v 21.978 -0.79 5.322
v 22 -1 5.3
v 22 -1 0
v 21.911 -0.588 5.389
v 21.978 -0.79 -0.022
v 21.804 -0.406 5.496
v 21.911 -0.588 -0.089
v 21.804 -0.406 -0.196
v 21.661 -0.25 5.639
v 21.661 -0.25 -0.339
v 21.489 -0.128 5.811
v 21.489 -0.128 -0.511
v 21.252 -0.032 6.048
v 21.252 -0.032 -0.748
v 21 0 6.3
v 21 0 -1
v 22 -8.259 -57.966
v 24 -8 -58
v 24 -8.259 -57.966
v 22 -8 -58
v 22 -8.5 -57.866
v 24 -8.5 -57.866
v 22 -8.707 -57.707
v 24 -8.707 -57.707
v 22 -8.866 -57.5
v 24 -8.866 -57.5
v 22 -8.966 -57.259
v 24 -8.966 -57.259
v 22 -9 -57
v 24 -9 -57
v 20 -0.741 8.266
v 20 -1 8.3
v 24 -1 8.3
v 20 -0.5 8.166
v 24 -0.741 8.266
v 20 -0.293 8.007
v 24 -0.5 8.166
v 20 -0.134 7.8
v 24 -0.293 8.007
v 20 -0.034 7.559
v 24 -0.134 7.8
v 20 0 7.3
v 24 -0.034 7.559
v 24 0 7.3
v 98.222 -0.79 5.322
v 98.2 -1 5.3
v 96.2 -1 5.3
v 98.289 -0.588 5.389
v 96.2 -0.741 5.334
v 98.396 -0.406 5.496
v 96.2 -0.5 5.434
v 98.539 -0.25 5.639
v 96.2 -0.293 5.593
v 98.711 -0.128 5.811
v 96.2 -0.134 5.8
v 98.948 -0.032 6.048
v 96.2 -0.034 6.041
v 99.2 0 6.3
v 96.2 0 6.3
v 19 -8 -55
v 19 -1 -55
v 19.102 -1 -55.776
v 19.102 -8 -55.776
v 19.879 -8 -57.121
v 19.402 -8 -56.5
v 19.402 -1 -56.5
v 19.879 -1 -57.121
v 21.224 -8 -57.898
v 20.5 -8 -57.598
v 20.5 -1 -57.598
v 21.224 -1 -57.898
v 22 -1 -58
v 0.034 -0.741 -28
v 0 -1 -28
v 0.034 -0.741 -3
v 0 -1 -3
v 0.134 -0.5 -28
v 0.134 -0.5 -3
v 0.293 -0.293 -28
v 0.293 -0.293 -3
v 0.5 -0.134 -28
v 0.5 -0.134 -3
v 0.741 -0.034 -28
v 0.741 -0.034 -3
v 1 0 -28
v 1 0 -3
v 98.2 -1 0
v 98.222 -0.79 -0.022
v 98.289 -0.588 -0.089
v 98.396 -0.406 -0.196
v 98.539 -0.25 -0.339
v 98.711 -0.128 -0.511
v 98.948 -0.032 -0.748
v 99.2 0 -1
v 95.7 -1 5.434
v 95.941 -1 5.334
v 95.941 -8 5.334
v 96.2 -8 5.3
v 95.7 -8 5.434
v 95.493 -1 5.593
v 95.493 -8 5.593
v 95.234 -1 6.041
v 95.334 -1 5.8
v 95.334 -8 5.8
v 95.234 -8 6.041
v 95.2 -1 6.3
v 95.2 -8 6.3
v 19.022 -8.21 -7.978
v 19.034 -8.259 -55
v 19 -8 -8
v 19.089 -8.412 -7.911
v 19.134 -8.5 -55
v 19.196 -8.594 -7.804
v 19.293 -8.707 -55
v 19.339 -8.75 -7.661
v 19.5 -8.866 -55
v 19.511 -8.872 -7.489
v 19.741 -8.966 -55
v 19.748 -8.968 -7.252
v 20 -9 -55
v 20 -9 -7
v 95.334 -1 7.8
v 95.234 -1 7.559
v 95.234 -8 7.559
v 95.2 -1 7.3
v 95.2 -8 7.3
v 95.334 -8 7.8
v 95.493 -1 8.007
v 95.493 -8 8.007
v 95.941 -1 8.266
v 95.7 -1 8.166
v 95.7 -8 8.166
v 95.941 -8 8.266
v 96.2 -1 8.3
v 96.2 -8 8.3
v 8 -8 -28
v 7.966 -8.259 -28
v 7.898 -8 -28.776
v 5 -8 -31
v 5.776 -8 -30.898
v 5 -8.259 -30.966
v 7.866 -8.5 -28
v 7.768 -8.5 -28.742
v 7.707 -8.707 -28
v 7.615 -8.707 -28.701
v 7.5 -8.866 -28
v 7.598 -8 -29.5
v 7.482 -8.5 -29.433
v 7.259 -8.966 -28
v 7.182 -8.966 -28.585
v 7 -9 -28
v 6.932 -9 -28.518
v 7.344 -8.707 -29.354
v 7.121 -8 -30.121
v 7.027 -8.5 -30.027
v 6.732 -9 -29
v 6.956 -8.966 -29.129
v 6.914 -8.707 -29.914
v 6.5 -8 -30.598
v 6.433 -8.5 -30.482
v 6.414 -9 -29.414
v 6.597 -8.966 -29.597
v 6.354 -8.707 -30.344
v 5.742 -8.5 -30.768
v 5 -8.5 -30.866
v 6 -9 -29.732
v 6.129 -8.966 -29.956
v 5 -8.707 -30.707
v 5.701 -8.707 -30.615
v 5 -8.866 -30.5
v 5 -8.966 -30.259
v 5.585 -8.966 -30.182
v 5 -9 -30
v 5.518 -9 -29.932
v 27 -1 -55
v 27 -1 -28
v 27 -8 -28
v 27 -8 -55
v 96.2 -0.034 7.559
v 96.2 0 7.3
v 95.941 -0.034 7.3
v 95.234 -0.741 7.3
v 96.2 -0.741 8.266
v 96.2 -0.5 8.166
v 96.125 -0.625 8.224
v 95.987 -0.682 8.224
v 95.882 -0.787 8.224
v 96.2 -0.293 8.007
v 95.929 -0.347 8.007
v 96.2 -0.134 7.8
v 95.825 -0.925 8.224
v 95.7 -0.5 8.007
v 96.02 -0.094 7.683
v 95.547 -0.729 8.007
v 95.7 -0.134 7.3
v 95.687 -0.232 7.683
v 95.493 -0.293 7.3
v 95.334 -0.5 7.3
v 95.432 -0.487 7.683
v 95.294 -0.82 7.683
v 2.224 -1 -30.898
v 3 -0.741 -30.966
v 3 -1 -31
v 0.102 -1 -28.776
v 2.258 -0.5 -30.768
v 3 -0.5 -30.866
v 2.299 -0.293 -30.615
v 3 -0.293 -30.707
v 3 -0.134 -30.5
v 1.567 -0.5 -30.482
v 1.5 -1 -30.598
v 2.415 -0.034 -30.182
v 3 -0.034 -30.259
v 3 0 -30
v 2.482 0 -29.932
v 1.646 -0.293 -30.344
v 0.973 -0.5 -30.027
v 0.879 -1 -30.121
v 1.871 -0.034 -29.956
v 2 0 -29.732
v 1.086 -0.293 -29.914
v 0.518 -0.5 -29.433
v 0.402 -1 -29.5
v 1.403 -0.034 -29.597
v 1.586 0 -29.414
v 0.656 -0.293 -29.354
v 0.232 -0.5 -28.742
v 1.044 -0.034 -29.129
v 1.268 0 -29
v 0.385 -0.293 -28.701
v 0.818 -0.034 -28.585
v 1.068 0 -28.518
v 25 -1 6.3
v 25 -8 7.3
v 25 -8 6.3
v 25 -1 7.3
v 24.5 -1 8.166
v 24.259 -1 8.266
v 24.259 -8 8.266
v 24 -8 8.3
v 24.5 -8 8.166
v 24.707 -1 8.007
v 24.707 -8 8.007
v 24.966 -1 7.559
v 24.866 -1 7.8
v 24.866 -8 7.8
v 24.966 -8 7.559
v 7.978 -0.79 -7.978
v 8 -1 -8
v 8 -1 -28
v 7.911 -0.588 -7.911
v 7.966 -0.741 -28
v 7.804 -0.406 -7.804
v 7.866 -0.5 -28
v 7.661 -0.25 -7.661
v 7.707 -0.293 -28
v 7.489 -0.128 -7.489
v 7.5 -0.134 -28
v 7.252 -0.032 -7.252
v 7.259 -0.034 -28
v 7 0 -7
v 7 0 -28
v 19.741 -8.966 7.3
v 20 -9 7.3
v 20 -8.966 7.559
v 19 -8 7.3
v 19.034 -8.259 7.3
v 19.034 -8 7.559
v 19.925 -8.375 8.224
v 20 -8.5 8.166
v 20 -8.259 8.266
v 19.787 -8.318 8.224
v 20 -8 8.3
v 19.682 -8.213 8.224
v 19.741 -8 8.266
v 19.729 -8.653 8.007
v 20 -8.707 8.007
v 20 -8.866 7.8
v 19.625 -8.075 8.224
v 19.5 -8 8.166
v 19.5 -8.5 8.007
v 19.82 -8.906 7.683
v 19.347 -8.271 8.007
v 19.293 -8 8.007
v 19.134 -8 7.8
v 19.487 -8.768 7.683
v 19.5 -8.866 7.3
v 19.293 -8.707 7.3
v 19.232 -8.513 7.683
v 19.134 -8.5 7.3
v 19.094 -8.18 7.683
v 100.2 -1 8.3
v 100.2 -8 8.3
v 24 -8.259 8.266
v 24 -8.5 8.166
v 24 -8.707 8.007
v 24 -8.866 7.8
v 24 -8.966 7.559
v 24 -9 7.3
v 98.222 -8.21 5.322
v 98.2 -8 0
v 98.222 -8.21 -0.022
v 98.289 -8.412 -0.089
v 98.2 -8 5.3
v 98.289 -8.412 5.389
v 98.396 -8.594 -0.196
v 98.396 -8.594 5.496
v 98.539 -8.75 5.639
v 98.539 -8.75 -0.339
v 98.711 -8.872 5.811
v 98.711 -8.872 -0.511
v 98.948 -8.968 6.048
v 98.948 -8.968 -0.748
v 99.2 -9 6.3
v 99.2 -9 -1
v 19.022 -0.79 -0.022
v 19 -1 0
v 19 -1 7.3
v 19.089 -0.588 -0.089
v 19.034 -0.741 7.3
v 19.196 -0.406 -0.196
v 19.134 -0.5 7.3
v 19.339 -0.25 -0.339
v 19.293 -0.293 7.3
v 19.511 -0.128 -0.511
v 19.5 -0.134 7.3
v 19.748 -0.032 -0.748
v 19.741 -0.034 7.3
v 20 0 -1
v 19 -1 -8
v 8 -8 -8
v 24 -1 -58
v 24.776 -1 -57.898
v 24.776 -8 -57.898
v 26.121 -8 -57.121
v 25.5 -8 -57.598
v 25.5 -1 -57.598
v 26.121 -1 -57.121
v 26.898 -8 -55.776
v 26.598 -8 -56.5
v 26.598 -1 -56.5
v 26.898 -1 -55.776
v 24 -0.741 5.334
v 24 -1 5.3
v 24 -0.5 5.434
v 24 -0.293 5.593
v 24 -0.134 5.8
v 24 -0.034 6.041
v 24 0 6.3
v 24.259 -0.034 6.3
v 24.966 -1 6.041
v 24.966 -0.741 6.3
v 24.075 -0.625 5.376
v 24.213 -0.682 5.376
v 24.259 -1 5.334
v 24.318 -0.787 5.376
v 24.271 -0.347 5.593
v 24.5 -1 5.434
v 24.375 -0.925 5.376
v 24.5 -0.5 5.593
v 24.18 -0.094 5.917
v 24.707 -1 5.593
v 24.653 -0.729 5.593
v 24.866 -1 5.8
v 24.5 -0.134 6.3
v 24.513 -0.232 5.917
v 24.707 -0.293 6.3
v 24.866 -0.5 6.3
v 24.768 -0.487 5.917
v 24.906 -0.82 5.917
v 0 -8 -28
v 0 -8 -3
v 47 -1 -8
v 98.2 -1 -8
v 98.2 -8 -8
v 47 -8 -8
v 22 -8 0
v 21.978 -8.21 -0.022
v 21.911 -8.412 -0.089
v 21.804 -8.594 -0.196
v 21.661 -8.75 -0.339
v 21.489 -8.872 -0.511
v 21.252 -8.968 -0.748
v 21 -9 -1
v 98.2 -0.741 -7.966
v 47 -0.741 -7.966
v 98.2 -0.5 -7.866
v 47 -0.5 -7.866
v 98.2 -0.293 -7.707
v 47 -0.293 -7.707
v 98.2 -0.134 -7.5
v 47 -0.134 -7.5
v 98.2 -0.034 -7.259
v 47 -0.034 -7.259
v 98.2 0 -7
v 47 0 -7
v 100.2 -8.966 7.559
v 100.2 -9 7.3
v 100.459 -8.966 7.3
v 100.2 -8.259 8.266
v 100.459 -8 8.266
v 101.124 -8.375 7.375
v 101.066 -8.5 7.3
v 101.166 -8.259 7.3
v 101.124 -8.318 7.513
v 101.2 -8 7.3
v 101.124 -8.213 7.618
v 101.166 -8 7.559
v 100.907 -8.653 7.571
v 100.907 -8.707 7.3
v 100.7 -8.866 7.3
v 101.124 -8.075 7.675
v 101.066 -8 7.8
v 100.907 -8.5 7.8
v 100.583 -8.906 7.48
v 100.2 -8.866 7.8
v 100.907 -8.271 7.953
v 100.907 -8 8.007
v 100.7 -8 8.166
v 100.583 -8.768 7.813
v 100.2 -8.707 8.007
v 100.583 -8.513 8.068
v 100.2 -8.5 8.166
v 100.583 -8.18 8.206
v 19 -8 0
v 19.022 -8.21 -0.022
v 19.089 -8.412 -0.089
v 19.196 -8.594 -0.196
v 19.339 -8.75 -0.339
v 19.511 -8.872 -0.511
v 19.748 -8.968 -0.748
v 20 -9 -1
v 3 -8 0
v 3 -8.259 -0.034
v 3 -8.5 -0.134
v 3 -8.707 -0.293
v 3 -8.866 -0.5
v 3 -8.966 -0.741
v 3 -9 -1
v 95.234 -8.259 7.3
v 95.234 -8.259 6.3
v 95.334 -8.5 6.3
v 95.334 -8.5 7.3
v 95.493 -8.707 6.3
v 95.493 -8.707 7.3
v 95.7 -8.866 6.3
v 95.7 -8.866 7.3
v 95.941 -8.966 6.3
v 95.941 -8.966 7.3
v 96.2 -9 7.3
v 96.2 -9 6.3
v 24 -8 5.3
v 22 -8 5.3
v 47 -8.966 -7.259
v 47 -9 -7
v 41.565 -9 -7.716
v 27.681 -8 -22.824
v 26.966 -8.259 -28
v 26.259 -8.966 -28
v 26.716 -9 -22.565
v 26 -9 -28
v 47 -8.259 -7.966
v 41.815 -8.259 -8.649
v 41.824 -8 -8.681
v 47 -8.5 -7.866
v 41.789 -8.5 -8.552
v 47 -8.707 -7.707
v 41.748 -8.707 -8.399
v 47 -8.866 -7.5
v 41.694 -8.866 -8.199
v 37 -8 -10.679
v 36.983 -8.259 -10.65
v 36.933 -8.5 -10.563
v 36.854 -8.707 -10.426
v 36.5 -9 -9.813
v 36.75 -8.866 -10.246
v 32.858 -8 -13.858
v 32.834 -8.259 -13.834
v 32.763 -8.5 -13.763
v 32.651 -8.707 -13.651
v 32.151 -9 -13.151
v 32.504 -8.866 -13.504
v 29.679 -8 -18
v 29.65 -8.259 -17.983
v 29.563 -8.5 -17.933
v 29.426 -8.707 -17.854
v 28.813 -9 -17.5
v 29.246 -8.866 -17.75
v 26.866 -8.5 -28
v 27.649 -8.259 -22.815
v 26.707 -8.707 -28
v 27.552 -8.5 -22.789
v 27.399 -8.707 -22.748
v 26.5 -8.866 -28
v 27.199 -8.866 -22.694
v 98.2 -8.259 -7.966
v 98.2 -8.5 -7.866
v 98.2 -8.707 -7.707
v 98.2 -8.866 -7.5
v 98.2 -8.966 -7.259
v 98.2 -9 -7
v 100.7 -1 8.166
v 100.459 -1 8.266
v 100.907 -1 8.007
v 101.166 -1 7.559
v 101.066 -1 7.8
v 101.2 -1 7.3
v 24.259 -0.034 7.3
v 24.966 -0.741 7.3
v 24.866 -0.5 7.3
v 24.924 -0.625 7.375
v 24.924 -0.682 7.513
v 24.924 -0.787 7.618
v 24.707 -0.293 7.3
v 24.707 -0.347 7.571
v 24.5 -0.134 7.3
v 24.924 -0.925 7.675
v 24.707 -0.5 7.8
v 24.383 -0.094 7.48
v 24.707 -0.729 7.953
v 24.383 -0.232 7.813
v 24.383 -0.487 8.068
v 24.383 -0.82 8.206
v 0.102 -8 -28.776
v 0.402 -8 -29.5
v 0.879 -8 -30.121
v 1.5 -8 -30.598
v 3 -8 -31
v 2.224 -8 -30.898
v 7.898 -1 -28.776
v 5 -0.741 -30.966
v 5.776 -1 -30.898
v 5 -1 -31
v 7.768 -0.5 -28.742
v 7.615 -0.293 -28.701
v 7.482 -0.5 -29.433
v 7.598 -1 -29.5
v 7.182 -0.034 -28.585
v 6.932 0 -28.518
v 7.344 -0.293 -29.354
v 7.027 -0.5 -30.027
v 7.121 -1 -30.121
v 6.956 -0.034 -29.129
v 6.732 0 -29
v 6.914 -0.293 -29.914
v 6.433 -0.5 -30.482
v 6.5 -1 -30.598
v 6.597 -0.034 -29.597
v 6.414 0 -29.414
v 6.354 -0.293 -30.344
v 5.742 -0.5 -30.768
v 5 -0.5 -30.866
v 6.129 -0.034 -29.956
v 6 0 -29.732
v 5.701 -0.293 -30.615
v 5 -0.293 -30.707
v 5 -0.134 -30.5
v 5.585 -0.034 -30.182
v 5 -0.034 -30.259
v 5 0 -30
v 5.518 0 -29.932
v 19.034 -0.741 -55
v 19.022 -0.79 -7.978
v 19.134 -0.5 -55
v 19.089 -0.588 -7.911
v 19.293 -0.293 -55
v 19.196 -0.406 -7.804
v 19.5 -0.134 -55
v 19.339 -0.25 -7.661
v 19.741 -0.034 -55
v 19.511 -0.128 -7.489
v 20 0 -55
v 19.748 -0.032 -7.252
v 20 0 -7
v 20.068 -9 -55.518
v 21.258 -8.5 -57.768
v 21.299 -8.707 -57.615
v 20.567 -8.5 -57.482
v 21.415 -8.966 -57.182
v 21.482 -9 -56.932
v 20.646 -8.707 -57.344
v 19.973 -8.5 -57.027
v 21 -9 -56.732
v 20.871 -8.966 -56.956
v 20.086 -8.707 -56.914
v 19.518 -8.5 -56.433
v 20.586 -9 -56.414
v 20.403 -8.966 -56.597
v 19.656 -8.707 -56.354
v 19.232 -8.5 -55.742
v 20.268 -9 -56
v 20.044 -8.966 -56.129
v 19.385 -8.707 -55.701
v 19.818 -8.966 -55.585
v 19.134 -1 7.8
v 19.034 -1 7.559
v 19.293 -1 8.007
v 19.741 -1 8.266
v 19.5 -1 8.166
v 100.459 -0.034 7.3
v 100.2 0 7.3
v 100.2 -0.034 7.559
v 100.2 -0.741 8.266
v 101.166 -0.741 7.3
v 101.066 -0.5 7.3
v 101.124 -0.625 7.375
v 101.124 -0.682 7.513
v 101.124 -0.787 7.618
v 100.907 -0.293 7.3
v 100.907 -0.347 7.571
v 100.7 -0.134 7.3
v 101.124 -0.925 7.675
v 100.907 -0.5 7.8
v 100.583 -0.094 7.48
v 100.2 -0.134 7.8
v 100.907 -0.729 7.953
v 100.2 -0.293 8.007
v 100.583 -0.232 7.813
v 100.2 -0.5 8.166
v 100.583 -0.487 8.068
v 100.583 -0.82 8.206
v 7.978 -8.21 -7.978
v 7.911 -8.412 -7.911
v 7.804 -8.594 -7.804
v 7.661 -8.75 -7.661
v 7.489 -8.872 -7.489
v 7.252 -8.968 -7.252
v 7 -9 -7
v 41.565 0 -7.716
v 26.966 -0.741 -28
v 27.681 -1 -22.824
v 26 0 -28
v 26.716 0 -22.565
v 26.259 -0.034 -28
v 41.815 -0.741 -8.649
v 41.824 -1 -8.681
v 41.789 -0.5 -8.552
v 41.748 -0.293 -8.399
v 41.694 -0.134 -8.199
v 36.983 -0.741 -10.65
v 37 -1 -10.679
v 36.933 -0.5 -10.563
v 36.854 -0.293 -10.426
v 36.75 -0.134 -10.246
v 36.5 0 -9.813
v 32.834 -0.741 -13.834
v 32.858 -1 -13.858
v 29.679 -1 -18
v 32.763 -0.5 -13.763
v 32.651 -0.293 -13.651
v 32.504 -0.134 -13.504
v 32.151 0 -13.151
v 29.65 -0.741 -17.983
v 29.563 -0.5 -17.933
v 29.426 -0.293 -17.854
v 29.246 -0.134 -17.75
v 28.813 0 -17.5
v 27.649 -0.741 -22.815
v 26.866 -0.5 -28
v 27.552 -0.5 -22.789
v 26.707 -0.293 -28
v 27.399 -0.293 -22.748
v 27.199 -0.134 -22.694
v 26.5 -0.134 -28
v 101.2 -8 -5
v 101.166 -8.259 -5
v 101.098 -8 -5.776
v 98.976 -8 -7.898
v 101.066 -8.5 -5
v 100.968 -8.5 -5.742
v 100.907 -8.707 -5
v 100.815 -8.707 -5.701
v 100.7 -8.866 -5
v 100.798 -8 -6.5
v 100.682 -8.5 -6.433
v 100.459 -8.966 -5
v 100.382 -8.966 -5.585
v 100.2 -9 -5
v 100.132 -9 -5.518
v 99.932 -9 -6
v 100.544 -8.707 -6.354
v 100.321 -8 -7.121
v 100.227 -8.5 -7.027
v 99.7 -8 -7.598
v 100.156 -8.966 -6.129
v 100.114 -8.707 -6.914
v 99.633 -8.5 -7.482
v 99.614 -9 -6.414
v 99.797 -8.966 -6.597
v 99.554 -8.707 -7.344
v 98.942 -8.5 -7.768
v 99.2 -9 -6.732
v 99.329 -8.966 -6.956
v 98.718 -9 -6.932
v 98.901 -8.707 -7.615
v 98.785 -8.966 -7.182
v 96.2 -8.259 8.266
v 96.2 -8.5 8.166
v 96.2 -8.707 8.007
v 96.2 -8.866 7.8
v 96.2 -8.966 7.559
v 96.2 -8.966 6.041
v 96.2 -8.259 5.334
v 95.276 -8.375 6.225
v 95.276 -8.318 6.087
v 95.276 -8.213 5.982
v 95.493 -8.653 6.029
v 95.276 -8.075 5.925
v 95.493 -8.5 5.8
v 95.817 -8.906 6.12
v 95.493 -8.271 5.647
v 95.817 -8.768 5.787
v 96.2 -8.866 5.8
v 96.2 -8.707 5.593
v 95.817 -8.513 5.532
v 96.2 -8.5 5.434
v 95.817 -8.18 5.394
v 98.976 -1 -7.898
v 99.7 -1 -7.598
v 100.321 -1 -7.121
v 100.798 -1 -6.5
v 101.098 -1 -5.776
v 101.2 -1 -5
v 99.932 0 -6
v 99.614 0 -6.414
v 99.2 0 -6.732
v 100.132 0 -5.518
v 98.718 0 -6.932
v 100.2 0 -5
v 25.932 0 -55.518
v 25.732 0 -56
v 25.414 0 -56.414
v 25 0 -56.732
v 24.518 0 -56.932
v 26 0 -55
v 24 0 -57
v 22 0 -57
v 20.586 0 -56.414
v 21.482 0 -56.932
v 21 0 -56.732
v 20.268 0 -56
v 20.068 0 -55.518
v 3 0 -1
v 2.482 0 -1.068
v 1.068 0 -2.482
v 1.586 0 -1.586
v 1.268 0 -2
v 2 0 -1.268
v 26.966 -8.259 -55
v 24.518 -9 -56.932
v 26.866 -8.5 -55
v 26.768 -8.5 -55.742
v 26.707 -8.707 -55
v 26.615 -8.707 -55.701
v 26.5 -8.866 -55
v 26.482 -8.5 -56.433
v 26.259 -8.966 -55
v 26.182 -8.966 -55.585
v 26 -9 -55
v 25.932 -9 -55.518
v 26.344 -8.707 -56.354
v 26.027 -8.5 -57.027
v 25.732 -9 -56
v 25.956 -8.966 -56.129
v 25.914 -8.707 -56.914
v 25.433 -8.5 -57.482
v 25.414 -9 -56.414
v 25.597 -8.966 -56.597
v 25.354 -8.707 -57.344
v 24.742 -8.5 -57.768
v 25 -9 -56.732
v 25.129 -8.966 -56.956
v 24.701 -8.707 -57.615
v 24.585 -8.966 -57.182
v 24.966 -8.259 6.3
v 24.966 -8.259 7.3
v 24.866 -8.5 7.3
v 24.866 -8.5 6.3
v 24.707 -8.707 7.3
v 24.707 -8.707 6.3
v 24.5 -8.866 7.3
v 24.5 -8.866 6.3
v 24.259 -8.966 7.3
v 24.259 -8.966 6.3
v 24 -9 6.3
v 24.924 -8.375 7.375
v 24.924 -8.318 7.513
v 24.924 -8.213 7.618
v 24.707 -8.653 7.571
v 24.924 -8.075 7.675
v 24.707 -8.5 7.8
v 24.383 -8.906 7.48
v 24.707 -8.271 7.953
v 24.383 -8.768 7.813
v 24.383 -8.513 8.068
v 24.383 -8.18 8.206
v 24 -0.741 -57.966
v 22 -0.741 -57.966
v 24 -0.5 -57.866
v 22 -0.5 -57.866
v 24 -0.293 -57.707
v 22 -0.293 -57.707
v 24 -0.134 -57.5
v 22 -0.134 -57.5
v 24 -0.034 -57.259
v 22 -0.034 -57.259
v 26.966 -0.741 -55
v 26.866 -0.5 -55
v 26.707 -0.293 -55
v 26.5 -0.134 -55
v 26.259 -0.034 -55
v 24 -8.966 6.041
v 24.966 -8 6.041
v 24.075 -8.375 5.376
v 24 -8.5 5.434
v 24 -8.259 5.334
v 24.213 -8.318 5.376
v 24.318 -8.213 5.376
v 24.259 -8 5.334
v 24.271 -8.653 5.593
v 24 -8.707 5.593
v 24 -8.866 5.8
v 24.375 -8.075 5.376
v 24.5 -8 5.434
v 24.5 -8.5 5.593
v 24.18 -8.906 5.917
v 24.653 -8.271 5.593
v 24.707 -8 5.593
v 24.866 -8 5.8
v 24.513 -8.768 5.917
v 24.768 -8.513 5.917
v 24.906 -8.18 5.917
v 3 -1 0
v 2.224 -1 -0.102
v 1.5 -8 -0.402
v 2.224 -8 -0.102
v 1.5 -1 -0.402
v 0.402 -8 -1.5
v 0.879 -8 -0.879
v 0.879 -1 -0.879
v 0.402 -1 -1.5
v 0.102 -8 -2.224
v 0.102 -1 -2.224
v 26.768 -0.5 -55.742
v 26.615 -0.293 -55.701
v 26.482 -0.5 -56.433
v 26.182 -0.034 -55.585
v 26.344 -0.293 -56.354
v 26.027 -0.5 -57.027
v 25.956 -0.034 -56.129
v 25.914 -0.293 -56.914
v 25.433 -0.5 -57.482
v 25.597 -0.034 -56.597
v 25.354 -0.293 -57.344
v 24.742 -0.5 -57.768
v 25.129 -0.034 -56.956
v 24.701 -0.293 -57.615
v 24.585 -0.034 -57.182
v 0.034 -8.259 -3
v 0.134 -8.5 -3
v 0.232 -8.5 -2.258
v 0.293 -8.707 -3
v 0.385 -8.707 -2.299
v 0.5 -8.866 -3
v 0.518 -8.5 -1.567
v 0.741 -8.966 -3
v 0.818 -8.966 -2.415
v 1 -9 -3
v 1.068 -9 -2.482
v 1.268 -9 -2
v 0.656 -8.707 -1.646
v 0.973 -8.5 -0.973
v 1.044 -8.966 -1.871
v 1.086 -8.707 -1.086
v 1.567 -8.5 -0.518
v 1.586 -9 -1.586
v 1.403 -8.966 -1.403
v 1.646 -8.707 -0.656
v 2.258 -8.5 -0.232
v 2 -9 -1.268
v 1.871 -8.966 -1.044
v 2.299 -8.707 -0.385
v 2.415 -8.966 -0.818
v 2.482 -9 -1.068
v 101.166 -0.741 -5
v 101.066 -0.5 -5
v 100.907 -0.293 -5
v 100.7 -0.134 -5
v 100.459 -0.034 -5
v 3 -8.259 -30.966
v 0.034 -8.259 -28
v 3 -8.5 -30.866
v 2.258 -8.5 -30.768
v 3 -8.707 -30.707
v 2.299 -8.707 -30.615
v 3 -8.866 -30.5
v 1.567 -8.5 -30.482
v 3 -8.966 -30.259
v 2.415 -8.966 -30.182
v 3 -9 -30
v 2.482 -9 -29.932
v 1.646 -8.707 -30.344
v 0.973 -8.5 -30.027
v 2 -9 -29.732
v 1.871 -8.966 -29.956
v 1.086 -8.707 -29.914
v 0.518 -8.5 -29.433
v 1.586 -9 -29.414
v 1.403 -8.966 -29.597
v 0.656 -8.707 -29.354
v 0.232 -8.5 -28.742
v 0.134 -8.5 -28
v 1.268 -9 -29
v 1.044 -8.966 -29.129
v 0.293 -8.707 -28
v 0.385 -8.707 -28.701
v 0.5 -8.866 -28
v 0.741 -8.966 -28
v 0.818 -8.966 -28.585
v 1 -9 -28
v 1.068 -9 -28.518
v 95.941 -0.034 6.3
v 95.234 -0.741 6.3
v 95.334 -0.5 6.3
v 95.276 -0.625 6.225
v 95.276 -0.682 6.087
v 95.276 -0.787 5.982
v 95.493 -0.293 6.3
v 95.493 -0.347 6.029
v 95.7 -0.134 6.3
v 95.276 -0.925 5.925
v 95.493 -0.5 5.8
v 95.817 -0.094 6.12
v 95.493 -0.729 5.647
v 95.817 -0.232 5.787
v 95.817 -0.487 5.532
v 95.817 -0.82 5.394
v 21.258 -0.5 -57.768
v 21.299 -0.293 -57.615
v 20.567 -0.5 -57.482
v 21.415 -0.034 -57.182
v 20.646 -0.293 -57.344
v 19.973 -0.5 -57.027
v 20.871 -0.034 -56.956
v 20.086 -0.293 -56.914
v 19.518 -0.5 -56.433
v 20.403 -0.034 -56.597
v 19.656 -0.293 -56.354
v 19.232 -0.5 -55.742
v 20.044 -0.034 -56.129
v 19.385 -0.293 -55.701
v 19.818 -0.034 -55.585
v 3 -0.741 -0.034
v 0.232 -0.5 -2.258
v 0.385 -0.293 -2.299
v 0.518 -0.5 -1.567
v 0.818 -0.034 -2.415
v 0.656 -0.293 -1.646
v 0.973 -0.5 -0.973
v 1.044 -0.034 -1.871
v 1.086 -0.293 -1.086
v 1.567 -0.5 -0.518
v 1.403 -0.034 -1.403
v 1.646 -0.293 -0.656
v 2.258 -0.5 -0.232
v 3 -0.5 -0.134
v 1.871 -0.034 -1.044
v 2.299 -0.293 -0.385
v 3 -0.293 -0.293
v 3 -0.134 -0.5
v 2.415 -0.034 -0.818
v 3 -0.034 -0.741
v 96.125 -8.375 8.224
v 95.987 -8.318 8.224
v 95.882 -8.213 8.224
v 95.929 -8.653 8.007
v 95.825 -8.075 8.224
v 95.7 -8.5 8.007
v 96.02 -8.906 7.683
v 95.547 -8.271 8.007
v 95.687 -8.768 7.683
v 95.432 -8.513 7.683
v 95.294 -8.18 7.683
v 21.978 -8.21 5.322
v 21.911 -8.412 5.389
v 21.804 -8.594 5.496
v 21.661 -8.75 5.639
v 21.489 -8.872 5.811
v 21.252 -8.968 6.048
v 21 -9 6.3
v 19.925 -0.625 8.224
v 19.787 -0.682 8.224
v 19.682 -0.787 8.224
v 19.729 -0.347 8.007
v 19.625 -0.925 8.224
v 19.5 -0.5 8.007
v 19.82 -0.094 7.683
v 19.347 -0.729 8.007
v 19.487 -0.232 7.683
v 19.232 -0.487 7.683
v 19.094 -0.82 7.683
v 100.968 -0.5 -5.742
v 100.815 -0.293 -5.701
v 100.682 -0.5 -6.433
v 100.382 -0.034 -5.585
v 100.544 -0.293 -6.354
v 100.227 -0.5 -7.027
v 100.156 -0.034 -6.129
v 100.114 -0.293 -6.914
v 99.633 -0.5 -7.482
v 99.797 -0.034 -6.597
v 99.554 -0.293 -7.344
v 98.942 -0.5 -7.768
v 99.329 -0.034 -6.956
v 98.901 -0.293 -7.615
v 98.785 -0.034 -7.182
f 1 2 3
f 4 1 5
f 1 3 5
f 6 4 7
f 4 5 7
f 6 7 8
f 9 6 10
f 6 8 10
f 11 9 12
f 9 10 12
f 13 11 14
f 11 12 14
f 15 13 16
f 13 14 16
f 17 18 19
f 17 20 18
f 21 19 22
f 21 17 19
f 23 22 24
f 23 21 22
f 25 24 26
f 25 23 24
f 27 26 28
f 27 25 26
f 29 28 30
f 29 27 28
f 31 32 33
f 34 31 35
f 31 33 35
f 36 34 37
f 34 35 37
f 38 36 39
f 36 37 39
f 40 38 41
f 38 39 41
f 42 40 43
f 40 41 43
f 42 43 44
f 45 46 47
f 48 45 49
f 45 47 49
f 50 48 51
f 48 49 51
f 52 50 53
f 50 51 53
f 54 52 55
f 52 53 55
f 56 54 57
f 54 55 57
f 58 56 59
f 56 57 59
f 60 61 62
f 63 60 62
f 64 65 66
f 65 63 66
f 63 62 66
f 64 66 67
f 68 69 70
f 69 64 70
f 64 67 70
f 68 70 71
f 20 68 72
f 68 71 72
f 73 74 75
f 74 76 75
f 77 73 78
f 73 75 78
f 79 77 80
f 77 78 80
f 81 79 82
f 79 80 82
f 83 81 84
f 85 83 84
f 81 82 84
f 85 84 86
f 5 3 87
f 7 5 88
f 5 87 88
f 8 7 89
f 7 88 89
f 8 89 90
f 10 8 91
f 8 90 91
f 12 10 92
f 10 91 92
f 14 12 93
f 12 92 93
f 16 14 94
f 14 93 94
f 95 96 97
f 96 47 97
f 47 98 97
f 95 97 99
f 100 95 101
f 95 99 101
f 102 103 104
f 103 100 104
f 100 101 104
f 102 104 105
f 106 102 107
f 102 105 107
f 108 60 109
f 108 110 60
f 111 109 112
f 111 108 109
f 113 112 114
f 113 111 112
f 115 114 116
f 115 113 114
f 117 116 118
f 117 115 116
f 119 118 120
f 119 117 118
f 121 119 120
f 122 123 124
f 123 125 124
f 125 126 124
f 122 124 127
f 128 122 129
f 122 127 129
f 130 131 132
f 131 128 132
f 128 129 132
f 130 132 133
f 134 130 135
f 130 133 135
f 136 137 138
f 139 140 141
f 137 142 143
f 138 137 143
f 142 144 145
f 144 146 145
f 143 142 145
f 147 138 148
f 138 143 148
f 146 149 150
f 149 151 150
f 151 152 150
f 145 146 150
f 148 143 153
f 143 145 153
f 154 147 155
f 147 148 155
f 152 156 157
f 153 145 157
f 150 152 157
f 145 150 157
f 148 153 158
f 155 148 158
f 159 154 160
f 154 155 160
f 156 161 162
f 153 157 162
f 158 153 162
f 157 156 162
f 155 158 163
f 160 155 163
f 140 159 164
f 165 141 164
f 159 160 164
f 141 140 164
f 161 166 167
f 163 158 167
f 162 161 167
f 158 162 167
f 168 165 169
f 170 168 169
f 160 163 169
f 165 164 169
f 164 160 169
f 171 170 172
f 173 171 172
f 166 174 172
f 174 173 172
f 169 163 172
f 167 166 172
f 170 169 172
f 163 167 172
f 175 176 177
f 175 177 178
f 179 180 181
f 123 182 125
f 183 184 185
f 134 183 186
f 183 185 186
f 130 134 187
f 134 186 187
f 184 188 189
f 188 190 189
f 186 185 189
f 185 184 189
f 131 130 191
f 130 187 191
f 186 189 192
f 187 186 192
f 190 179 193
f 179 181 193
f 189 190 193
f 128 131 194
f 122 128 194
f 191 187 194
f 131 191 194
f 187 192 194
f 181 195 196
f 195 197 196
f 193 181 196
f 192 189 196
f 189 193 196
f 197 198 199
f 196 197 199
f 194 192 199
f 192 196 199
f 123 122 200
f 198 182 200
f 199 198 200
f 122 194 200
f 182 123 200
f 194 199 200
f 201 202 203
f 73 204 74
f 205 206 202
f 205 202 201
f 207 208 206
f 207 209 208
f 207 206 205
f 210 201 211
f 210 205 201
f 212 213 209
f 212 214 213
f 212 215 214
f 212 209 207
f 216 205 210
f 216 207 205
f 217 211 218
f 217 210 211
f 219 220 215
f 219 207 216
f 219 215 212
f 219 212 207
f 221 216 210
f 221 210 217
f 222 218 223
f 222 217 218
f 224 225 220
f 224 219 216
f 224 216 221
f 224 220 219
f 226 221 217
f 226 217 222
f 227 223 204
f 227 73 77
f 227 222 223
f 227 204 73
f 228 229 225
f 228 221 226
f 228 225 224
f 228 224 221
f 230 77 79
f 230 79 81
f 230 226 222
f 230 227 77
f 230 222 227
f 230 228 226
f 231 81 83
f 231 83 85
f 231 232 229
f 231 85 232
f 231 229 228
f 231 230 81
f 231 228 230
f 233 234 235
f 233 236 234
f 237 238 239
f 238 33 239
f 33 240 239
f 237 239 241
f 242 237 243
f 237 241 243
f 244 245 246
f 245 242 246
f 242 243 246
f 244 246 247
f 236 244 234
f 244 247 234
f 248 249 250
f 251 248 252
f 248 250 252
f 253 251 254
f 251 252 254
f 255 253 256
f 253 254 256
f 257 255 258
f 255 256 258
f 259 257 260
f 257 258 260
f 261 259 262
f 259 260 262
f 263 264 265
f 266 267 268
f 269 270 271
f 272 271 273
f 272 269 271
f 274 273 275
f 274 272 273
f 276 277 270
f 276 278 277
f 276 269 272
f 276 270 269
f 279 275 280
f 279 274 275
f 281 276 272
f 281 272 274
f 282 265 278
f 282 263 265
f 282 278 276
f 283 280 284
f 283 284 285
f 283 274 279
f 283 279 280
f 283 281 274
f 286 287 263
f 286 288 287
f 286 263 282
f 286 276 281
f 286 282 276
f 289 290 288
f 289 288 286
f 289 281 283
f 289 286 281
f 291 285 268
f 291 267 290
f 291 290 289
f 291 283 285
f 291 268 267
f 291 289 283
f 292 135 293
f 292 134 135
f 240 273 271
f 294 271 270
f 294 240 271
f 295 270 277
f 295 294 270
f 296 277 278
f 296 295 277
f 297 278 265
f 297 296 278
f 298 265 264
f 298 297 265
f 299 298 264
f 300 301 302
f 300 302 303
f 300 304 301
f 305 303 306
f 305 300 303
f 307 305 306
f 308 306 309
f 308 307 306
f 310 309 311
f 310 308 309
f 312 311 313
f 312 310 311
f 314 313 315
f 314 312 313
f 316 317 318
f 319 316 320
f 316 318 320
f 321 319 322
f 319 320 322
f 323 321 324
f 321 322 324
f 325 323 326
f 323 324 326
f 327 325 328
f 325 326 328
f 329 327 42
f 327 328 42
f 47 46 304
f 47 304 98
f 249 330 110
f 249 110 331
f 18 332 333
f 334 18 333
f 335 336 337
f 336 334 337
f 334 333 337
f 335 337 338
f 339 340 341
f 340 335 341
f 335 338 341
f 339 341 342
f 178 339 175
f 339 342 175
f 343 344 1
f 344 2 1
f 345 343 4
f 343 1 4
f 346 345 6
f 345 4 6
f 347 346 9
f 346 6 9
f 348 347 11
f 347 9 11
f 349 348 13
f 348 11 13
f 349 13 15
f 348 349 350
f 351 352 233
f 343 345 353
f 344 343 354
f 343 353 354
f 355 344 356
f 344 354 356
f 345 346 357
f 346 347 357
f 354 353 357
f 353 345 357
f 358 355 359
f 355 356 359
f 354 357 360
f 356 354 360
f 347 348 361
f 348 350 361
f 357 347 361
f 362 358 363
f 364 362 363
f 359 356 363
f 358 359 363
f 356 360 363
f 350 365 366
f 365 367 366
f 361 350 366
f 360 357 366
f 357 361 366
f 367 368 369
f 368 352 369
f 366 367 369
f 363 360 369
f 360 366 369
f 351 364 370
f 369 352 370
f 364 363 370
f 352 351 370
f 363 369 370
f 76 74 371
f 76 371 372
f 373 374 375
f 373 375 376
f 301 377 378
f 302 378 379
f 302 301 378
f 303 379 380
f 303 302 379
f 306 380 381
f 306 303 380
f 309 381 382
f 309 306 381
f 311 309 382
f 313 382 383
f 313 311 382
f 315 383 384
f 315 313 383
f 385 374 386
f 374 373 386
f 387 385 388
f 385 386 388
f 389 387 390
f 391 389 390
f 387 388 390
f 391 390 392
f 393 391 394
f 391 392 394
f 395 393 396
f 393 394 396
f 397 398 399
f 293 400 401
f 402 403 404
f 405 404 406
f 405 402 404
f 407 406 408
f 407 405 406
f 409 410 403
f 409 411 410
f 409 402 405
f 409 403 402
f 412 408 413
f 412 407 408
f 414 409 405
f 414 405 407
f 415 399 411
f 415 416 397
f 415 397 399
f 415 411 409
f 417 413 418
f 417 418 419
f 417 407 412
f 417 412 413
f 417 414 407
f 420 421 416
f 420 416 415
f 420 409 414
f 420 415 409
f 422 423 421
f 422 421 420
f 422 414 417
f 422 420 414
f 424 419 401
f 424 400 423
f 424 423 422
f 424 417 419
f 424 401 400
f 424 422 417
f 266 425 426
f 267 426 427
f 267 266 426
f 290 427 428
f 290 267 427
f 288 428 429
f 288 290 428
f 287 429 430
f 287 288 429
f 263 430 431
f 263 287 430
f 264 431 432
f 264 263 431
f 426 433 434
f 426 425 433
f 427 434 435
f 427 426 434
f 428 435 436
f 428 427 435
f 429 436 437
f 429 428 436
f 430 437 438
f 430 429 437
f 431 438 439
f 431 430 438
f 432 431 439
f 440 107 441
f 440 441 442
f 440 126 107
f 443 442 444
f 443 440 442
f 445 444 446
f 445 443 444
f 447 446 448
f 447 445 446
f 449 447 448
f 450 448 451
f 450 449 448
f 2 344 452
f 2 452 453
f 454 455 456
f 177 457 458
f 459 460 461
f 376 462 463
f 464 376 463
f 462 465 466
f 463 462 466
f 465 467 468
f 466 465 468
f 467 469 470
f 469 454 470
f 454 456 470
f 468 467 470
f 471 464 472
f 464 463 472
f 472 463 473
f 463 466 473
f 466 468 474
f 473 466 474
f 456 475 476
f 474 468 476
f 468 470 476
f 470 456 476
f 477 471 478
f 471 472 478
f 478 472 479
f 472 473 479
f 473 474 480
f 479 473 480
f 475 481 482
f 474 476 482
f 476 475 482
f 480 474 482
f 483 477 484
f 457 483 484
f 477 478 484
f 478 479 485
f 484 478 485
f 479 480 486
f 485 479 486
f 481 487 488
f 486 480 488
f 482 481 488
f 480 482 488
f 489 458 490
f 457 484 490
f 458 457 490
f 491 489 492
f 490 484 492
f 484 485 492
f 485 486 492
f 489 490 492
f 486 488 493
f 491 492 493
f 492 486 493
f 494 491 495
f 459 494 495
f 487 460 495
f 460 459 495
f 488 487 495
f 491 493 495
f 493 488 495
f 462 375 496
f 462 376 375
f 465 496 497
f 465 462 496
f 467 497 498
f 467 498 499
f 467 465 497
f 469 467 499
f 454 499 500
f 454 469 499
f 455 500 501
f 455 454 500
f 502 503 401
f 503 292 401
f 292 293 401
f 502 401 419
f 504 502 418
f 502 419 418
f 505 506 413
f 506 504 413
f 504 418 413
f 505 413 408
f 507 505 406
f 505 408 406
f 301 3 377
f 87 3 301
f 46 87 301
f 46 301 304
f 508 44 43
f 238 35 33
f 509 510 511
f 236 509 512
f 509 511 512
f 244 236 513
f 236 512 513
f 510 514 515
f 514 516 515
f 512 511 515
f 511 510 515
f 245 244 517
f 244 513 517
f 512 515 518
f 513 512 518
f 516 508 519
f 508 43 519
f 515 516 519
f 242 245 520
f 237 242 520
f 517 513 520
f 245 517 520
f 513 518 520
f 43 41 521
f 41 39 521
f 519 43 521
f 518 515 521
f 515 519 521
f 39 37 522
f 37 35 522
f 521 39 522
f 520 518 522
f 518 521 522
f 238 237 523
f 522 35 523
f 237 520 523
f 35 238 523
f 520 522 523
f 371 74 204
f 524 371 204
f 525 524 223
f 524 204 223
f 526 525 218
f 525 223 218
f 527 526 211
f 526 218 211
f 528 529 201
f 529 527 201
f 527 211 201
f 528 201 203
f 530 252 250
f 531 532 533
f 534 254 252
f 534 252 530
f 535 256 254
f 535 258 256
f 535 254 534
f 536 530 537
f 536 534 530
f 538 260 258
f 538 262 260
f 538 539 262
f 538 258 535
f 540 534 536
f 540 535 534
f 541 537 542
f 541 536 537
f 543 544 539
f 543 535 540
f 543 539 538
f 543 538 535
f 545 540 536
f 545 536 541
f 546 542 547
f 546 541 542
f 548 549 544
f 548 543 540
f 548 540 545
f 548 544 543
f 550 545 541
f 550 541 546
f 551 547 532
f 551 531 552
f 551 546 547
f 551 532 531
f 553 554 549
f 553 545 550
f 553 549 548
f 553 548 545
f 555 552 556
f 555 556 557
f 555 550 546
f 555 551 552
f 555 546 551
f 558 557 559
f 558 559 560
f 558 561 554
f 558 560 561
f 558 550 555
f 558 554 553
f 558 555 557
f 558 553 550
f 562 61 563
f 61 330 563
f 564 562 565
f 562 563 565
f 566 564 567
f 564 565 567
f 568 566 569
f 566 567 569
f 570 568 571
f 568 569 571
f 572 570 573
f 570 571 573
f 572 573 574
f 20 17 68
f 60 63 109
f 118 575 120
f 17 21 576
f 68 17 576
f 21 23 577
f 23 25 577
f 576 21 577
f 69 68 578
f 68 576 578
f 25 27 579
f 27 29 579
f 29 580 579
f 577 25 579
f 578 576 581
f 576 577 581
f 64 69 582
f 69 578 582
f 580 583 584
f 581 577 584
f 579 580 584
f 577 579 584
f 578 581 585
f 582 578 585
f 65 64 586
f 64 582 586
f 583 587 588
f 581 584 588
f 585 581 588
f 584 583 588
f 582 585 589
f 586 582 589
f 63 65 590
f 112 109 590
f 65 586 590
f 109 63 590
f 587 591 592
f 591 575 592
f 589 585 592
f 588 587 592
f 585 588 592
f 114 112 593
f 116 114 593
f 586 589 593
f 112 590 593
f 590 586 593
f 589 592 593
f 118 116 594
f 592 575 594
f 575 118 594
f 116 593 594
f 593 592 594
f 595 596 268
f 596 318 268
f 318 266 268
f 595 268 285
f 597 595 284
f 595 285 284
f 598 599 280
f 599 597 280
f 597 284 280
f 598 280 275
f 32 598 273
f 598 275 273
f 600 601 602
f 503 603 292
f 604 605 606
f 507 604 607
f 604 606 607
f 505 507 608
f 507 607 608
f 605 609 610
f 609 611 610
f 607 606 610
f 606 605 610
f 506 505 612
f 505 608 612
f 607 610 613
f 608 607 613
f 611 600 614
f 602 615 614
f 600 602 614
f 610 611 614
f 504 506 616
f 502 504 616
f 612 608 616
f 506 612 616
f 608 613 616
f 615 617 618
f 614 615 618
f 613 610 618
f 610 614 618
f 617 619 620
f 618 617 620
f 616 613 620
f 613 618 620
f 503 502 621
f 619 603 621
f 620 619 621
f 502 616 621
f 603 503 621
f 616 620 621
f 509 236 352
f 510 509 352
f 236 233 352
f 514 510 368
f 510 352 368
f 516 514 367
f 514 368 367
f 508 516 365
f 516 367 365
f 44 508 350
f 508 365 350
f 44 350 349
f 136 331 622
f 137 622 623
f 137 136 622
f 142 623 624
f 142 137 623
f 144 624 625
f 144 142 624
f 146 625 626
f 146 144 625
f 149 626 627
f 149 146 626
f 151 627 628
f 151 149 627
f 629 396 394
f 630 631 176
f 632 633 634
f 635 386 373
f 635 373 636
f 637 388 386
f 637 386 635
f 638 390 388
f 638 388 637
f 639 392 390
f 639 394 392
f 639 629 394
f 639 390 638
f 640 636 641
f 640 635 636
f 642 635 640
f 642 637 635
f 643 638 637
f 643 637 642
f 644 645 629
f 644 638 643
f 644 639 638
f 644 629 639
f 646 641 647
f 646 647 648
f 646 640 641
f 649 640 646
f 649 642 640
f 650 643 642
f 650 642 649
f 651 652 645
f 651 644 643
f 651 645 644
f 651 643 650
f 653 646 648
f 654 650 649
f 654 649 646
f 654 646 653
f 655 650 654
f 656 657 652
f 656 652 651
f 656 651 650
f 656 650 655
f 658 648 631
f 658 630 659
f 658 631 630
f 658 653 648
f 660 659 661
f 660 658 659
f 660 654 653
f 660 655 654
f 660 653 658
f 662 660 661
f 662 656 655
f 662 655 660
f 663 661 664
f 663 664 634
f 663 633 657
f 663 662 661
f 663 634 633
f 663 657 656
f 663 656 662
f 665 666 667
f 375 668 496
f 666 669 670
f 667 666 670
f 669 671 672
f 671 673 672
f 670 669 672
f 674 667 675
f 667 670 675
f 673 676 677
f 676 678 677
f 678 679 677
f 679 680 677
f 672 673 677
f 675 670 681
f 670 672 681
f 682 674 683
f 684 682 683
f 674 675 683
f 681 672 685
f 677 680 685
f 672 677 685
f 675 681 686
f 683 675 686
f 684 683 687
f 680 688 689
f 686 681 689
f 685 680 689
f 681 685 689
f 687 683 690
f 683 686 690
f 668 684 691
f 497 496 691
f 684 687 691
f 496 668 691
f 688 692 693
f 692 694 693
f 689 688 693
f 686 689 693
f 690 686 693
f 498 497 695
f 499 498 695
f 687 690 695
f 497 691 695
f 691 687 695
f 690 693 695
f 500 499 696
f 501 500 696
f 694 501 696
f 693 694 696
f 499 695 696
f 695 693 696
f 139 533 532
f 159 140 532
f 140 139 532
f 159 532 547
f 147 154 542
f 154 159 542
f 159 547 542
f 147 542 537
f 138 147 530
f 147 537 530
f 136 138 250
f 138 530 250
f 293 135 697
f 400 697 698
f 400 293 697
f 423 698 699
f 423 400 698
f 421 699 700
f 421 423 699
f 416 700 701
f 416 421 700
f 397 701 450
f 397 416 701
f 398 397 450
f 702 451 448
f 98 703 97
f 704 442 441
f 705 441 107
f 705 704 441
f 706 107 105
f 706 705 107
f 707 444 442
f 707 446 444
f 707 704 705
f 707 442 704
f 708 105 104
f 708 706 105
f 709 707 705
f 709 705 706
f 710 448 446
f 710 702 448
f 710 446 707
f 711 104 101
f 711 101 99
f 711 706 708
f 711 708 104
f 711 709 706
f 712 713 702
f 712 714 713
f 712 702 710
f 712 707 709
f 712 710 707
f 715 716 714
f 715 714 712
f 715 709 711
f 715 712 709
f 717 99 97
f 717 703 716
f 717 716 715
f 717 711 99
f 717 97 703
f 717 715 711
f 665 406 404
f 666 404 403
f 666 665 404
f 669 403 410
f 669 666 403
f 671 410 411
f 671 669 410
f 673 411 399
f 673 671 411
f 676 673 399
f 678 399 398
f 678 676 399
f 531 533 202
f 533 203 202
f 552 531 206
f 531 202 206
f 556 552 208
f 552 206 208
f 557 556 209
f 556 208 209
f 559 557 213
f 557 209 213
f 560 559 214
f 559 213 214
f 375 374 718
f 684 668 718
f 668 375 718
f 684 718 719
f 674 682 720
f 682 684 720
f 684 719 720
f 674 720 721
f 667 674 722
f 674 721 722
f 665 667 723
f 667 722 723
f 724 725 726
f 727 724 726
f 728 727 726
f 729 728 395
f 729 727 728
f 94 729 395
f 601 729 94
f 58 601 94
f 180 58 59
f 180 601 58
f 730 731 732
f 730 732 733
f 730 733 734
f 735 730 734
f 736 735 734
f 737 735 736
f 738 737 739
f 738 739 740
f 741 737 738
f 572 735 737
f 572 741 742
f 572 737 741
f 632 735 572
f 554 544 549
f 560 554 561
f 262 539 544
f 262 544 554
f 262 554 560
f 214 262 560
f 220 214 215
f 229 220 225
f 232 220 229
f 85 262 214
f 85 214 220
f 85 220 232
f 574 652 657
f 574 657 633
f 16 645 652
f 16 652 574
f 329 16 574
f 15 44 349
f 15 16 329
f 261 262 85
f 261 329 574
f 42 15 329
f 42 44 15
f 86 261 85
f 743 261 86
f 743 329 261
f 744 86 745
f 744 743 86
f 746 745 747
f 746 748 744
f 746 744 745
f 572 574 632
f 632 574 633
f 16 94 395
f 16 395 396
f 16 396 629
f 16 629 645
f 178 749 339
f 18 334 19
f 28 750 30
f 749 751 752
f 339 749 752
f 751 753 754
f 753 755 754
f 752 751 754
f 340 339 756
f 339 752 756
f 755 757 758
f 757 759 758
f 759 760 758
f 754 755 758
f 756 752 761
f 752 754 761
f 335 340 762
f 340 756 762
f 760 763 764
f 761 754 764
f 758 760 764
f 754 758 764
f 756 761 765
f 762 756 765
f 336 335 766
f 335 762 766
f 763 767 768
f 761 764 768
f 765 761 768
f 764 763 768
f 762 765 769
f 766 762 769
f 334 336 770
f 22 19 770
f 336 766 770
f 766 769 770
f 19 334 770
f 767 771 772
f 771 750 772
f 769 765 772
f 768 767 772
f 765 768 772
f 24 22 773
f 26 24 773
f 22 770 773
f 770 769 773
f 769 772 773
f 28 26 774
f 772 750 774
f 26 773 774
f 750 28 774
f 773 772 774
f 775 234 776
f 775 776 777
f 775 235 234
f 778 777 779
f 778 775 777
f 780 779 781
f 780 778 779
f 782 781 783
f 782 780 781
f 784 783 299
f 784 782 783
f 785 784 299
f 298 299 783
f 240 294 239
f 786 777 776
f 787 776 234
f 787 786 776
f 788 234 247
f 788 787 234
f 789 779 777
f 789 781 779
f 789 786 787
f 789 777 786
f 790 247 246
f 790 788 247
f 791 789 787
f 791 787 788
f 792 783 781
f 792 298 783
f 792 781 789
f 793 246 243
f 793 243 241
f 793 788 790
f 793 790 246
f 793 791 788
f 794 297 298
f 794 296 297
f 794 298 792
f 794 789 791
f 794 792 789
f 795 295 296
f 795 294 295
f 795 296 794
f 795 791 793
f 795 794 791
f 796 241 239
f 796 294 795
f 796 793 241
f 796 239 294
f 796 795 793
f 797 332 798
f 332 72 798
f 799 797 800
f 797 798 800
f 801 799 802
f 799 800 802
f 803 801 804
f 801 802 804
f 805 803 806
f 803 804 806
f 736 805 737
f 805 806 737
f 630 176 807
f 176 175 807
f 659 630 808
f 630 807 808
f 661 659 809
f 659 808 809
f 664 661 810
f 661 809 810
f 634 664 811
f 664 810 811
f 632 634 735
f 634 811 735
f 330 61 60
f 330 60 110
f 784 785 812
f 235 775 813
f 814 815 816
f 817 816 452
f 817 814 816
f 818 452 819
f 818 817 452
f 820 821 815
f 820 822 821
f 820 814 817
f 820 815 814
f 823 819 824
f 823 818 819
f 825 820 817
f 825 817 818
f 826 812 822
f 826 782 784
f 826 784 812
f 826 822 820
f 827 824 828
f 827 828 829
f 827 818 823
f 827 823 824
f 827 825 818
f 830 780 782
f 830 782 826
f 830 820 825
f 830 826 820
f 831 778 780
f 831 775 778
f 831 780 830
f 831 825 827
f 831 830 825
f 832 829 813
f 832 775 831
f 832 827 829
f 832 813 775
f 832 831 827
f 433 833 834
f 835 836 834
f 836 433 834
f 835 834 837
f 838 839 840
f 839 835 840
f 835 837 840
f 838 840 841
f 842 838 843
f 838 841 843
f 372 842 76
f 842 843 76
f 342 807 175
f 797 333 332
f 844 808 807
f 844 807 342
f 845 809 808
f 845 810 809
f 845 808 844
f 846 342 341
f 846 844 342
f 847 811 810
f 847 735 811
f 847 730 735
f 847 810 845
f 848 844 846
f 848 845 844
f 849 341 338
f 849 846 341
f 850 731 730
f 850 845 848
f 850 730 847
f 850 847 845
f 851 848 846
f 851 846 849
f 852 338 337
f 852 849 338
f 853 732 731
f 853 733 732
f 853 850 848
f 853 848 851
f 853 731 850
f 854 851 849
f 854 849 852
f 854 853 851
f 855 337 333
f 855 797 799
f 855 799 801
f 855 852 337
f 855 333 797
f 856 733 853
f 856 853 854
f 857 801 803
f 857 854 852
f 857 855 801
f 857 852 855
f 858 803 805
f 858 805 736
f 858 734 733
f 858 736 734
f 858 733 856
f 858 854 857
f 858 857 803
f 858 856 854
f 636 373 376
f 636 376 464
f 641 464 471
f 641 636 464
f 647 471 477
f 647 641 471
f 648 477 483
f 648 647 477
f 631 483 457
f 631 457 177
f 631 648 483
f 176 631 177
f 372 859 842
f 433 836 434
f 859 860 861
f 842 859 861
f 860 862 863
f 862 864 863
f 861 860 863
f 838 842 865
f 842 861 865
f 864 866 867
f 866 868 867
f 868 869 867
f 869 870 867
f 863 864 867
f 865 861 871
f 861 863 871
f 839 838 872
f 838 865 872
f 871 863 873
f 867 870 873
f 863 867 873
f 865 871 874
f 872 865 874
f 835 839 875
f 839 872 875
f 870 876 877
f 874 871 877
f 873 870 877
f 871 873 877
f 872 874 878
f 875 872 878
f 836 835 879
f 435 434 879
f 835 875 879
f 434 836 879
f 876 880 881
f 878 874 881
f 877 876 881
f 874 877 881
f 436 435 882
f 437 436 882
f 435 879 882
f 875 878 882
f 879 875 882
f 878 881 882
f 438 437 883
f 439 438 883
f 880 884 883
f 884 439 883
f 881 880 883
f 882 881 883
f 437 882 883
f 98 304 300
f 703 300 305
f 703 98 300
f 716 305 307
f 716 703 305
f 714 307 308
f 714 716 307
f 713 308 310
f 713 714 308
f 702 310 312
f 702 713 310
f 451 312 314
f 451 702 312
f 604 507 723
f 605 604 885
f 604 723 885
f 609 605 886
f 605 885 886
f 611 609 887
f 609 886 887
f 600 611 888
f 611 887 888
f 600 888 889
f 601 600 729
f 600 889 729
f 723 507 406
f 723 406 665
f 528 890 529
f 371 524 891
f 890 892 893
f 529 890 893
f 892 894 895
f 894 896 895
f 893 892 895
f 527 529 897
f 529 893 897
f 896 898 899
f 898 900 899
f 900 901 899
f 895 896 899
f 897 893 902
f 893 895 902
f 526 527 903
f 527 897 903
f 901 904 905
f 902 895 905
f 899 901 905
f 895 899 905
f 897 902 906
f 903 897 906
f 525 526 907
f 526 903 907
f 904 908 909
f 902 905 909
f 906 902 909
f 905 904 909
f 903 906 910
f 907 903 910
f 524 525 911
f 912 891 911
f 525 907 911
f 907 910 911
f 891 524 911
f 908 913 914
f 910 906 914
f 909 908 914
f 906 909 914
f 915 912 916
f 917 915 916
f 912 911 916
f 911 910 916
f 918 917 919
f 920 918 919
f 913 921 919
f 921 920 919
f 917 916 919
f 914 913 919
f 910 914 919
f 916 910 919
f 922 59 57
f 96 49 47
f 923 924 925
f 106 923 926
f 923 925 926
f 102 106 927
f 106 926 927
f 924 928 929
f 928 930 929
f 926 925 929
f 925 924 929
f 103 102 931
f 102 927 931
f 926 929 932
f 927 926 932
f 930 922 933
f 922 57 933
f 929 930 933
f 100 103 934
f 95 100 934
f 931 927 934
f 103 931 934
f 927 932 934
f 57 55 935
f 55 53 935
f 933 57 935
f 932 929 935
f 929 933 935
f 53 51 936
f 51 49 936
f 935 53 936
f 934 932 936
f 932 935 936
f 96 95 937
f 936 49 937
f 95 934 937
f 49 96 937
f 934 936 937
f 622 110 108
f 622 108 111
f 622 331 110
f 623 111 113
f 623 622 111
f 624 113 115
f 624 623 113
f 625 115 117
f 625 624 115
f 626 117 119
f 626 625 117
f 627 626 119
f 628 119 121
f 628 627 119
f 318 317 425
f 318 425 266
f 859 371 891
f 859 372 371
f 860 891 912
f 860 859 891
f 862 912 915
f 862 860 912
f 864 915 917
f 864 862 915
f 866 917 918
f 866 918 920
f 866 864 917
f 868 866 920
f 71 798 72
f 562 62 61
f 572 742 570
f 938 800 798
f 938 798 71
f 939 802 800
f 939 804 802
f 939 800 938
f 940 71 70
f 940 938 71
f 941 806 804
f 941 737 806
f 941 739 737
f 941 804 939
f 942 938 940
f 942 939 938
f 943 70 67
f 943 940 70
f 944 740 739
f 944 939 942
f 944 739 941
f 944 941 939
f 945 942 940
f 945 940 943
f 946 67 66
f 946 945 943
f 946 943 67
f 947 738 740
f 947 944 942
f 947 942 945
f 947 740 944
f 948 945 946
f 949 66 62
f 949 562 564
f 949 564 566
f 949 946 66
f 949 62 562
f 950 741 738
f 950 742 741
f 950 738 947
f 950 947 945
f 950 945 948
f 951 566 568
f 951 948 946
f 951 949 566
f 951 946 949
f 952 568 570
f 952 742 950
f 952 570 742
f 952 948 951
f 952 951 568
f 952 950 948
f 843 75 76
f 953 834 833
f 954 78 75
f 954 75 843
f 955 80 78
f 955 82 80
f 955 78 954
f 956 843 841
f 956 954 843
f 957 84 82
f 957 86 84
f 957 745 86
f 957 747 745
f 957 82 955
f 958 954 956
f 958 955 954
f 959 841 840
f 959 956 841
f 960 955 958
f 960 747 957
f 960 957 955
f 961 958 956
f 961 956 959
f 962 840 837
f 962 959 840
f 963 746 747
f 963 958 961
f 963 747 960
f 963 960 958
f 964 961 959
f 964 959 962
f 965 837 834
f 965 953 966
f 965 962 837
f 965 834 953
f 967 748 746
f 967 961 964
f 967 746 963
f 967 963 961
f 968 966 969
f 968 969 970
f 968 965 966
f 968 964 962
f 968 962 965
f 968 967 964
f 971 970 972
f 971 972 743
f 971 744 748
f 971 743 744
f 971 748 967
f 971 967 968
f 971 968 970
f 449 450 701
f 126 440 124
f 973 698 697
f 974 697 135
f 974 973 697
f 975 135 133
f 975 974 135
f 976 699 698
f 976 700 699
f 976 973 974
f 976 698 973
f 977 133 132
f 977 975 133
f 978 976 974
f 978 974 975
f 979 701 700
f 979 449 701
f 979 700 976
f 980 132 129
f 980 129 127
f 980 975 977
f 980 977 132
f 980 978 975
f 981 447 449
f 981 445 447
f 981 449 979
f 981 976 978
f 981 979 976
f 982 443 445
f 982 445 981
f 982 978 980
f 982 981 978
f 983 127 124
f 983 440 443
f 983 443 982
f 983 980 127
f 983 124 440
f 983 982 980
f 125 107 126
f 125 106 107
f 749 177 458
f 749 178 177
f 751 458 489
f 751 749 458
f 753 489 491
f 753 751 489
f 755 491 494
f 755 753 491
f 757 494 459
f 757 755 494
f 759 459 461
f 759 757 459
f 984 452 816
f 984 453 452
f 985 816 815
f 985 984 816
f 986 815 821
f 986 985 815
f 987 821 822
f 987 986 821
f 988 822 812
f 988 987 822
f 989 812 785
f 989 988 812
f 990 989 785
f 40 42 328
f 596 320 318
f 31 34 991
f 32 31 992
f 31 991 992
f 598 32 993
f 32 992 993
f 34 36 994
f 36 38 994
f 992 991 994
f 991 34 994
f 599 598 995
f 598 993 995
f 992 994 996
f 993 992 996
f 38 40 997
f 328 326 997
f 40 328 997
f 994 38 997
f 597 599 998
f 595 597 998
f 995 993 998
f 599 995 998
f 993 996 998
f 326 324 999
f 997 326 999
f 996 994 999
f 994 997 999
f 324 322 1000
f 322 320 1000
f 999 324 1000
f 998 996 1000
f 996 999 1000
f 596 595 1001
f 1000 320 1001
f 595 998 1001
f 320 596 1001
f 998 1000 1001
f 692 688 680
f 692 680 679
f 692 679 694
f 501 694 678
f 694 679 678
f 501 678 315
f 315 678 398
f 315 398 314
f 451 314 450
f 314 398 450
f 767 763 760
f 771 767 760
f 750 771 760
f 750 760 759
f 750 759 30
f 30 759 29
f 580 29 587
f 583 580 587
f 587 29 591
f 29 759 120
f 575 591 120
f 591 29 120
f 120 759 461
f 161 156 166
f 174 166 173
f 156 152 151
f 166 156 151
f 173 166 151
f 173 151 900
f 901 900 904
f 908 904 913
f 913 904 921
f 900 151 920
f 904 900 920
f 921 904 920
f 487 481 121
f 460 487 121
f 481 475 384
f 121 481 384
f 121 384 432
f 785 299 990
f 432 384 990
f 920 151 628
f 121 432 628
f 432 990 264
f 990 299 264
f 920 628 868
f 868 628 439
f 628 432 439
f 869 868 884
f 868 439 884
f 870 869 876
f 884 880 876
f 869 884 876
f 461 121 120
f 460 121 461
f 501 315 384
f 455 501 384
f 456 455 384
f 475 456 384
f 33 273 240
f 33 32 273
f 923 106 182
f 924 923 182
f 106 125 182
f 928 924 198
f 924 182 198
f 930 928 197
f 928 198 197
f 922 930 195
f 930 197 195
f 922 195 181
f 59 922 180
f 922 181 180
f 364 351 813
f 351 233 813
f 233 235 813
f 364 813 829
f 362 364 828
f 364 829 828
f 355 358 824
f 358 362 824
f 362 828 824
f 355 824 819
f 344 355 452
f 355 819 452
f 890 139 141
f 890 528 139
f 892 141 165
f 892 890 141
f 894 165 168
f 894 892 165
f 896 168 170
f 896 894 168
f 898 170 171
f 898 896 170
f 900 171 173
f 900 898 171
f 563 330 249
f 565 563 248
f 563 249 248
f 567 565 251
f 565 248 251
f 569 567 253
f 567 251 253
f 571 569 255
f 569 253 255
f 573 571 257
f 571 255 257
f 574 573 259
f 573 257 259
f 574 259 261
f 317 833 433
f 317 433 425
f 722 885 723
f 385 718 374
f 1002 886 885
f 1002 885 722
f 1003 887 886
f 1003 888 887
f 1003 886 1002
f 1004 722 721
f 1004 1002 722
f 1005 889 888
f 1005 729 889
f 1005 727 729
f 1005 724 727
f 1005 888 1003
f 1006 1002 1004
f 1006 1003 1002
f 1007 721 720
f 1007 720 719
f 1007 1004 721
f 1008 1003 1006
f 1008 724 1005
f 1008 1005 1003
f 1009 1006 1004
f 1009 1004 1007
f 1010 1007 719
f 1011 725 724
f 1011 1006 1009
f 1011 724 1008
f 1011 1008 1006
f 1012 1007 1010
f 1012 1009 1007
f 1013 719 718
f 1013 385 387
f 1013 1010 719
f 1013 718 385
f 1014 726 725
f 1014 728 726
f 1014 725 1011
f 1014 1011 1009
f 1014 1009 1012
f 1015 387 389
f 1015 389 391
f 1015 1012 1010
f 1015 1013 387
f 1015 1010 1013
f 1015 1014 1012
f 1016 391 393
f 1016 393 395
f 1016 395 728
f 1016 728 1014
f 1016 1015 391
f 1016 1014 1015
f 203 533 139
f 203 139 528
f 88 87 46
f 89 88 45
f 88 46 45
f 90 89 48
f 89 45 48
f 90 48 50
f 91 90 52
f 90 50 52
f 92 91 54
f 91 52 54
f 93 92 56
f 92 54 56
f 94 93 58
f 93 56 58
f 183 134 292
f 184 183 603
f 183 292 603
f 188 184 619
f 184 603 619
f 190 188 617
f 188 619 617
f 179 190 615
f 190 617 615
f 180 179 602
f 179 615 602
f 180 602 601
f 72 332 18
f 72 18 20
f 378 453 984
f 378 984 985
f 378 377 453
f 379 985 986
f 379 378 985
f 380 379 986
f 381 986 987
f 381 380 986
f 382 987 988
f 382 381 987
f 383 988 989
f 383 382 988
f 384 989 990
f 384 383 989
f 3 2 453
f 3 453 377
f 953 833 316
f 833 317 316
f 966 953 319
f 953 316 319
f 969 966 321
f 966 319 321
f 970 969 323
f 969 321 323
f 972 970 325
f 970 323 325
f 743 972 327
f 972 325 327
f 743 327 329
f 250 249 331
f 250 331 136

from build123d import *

# Parameters (mm, degrees)
PAD_DEPTH = 9
FILLET_R  = 1


with BuildPart() as part:
    # Sketch → Pad (new body)
    with BuildSketch(Plane.XZ):
        with BuildLine():
            Line((0, -28), (0, -3))
            ThreePointArc((3, 0), (0.87868, -0.87868), (0, -3))
            Line((3, 0), (19, 0))
            Line((19, 0), (19, 8.3))
            Line((19, 8.3), (25, 8.3))
            Line((25, 8.3), (25, 5.3))
            Line((25, 5.3), (22, 5.3))
            Line((22, 5.3), (22, 0))
            Line((22, 0), (98.2, 0))
            Line((98.2, 0), (98.2, 5.3))
            Line((98.2, 5.3), (95.2, 5.3))
            Line((95.2, 5.3), (95.2, 8.3))
            Line((95.2, 8.3), (101.2, 8.3))
            Line((101.2, 8.3), (101.2, -5))
            ThreePointArc((98.2, -8), (100.32132, -7.12132), (101.2, -5))
            Line((98.2, -8), (47, -8))
            ThreePointArc((47, -8), (32.857864, -13.857864), (27, -28))
            Line((27, -28), (27, -55))
            ThreePointArc((24, -58), (26.12132, -57.12132), (27, -55))
            Line((24, -58), (22, -58))
            ThreePointArc((19, -55), (19.87868, -57.12132), (22, -58))
            Line((19, -55), (19, -8))
            Line((19, -8), (8, -8))
            Line((8, -8), (8, -28))
            ThreePointArc((5, -31), (7.12132, -30.12132), (8, -28))
            Line((5, -31), (3, -31))
            ThreePointArc((0, -28), (0.87868, -30.12132), (3, -31))
        make_face()
    extrude(amount=PAD_DEPTH)

    # Fillet
    fillet_edges = [part.edges().sort_by_distance(p)[0] for p in [
        (4, -9, -31),
        (0.87868, -9, -30.12132),
        (0, -9, -15.5),
        (0.87868, -9, -0.87868),
        (11, -9, 0),
        (19, -9, 4.15),
        (22, -9, 8.3),
        (25, -9, 6.8),
        (23.5, -9, 5.3),
        (22, -9, 2.65),
        (60.1, -9, 0),
        (98.2, -9, 2.65),
        (96.7, -9, 5.3),
        (95.2, -9, 6.8),
        (98.2, -9, 8.3),
        (101.2, -9, 1.65),
        (100.32132, -9, -7.12132),
        (72.6, -9, -8),
        (32.857864, -9, -13.857864),
        (27, -9, -41.5),
        (26.12132, -9, -57.12132),
        (23, -9, -58),
        (19.87868, -9, -57.12132),
        (19, -9, -31.5),
        (13.5, -9, -8),
        (8, -9, -18),
        (7.12132, -9, -30.12132),
        (4, 0, -31),
        (0.87868, 0, -30.12132),
        (0, 0, -15.5),
        (0.87868, 0, -0.87868),
        (11, 0, 0),
        (19, 0, 4.15),
        (22, 0, 8.3),
        (25, 0, 6.8),
        (23.5, 0, 5.3),
        (22, 0, 2.65),
        (60.1, 0, 0),
        (98.2, 0, 2.65),
        (96.7, 0, 5.3),
        (95.2, 0, 6.8),
        (98.2, 0, 8.3),
        (101.2, 0, 1.65),
        (100.32132, 0, -7.12132),
        (72.6, 0, -8),
        (32.857864, 0, -13.857864),
        (27, 0, -41.5),
        (26.12132, 0, -57.12132),
        (23, 0, -58),
        (19.87868, 0, -57.12132),
        (19, 0, -31.5),
        (13.5, 0, -8),
        (8, 0, -18),
        (7.12132, 0, -30.12132),
        (25, -4.5, 8.3),
        (25, -4.5, 5.3),
        (19, -4.5, 8.3),
        (101.2, -4.5, 8.3),
        (95.2, -4.5, 8.3),
        (95.2, -4.5, 5.3),
    ]]
    fillet(fillet_edges, radius=FILLET_R)


solid = part.part
